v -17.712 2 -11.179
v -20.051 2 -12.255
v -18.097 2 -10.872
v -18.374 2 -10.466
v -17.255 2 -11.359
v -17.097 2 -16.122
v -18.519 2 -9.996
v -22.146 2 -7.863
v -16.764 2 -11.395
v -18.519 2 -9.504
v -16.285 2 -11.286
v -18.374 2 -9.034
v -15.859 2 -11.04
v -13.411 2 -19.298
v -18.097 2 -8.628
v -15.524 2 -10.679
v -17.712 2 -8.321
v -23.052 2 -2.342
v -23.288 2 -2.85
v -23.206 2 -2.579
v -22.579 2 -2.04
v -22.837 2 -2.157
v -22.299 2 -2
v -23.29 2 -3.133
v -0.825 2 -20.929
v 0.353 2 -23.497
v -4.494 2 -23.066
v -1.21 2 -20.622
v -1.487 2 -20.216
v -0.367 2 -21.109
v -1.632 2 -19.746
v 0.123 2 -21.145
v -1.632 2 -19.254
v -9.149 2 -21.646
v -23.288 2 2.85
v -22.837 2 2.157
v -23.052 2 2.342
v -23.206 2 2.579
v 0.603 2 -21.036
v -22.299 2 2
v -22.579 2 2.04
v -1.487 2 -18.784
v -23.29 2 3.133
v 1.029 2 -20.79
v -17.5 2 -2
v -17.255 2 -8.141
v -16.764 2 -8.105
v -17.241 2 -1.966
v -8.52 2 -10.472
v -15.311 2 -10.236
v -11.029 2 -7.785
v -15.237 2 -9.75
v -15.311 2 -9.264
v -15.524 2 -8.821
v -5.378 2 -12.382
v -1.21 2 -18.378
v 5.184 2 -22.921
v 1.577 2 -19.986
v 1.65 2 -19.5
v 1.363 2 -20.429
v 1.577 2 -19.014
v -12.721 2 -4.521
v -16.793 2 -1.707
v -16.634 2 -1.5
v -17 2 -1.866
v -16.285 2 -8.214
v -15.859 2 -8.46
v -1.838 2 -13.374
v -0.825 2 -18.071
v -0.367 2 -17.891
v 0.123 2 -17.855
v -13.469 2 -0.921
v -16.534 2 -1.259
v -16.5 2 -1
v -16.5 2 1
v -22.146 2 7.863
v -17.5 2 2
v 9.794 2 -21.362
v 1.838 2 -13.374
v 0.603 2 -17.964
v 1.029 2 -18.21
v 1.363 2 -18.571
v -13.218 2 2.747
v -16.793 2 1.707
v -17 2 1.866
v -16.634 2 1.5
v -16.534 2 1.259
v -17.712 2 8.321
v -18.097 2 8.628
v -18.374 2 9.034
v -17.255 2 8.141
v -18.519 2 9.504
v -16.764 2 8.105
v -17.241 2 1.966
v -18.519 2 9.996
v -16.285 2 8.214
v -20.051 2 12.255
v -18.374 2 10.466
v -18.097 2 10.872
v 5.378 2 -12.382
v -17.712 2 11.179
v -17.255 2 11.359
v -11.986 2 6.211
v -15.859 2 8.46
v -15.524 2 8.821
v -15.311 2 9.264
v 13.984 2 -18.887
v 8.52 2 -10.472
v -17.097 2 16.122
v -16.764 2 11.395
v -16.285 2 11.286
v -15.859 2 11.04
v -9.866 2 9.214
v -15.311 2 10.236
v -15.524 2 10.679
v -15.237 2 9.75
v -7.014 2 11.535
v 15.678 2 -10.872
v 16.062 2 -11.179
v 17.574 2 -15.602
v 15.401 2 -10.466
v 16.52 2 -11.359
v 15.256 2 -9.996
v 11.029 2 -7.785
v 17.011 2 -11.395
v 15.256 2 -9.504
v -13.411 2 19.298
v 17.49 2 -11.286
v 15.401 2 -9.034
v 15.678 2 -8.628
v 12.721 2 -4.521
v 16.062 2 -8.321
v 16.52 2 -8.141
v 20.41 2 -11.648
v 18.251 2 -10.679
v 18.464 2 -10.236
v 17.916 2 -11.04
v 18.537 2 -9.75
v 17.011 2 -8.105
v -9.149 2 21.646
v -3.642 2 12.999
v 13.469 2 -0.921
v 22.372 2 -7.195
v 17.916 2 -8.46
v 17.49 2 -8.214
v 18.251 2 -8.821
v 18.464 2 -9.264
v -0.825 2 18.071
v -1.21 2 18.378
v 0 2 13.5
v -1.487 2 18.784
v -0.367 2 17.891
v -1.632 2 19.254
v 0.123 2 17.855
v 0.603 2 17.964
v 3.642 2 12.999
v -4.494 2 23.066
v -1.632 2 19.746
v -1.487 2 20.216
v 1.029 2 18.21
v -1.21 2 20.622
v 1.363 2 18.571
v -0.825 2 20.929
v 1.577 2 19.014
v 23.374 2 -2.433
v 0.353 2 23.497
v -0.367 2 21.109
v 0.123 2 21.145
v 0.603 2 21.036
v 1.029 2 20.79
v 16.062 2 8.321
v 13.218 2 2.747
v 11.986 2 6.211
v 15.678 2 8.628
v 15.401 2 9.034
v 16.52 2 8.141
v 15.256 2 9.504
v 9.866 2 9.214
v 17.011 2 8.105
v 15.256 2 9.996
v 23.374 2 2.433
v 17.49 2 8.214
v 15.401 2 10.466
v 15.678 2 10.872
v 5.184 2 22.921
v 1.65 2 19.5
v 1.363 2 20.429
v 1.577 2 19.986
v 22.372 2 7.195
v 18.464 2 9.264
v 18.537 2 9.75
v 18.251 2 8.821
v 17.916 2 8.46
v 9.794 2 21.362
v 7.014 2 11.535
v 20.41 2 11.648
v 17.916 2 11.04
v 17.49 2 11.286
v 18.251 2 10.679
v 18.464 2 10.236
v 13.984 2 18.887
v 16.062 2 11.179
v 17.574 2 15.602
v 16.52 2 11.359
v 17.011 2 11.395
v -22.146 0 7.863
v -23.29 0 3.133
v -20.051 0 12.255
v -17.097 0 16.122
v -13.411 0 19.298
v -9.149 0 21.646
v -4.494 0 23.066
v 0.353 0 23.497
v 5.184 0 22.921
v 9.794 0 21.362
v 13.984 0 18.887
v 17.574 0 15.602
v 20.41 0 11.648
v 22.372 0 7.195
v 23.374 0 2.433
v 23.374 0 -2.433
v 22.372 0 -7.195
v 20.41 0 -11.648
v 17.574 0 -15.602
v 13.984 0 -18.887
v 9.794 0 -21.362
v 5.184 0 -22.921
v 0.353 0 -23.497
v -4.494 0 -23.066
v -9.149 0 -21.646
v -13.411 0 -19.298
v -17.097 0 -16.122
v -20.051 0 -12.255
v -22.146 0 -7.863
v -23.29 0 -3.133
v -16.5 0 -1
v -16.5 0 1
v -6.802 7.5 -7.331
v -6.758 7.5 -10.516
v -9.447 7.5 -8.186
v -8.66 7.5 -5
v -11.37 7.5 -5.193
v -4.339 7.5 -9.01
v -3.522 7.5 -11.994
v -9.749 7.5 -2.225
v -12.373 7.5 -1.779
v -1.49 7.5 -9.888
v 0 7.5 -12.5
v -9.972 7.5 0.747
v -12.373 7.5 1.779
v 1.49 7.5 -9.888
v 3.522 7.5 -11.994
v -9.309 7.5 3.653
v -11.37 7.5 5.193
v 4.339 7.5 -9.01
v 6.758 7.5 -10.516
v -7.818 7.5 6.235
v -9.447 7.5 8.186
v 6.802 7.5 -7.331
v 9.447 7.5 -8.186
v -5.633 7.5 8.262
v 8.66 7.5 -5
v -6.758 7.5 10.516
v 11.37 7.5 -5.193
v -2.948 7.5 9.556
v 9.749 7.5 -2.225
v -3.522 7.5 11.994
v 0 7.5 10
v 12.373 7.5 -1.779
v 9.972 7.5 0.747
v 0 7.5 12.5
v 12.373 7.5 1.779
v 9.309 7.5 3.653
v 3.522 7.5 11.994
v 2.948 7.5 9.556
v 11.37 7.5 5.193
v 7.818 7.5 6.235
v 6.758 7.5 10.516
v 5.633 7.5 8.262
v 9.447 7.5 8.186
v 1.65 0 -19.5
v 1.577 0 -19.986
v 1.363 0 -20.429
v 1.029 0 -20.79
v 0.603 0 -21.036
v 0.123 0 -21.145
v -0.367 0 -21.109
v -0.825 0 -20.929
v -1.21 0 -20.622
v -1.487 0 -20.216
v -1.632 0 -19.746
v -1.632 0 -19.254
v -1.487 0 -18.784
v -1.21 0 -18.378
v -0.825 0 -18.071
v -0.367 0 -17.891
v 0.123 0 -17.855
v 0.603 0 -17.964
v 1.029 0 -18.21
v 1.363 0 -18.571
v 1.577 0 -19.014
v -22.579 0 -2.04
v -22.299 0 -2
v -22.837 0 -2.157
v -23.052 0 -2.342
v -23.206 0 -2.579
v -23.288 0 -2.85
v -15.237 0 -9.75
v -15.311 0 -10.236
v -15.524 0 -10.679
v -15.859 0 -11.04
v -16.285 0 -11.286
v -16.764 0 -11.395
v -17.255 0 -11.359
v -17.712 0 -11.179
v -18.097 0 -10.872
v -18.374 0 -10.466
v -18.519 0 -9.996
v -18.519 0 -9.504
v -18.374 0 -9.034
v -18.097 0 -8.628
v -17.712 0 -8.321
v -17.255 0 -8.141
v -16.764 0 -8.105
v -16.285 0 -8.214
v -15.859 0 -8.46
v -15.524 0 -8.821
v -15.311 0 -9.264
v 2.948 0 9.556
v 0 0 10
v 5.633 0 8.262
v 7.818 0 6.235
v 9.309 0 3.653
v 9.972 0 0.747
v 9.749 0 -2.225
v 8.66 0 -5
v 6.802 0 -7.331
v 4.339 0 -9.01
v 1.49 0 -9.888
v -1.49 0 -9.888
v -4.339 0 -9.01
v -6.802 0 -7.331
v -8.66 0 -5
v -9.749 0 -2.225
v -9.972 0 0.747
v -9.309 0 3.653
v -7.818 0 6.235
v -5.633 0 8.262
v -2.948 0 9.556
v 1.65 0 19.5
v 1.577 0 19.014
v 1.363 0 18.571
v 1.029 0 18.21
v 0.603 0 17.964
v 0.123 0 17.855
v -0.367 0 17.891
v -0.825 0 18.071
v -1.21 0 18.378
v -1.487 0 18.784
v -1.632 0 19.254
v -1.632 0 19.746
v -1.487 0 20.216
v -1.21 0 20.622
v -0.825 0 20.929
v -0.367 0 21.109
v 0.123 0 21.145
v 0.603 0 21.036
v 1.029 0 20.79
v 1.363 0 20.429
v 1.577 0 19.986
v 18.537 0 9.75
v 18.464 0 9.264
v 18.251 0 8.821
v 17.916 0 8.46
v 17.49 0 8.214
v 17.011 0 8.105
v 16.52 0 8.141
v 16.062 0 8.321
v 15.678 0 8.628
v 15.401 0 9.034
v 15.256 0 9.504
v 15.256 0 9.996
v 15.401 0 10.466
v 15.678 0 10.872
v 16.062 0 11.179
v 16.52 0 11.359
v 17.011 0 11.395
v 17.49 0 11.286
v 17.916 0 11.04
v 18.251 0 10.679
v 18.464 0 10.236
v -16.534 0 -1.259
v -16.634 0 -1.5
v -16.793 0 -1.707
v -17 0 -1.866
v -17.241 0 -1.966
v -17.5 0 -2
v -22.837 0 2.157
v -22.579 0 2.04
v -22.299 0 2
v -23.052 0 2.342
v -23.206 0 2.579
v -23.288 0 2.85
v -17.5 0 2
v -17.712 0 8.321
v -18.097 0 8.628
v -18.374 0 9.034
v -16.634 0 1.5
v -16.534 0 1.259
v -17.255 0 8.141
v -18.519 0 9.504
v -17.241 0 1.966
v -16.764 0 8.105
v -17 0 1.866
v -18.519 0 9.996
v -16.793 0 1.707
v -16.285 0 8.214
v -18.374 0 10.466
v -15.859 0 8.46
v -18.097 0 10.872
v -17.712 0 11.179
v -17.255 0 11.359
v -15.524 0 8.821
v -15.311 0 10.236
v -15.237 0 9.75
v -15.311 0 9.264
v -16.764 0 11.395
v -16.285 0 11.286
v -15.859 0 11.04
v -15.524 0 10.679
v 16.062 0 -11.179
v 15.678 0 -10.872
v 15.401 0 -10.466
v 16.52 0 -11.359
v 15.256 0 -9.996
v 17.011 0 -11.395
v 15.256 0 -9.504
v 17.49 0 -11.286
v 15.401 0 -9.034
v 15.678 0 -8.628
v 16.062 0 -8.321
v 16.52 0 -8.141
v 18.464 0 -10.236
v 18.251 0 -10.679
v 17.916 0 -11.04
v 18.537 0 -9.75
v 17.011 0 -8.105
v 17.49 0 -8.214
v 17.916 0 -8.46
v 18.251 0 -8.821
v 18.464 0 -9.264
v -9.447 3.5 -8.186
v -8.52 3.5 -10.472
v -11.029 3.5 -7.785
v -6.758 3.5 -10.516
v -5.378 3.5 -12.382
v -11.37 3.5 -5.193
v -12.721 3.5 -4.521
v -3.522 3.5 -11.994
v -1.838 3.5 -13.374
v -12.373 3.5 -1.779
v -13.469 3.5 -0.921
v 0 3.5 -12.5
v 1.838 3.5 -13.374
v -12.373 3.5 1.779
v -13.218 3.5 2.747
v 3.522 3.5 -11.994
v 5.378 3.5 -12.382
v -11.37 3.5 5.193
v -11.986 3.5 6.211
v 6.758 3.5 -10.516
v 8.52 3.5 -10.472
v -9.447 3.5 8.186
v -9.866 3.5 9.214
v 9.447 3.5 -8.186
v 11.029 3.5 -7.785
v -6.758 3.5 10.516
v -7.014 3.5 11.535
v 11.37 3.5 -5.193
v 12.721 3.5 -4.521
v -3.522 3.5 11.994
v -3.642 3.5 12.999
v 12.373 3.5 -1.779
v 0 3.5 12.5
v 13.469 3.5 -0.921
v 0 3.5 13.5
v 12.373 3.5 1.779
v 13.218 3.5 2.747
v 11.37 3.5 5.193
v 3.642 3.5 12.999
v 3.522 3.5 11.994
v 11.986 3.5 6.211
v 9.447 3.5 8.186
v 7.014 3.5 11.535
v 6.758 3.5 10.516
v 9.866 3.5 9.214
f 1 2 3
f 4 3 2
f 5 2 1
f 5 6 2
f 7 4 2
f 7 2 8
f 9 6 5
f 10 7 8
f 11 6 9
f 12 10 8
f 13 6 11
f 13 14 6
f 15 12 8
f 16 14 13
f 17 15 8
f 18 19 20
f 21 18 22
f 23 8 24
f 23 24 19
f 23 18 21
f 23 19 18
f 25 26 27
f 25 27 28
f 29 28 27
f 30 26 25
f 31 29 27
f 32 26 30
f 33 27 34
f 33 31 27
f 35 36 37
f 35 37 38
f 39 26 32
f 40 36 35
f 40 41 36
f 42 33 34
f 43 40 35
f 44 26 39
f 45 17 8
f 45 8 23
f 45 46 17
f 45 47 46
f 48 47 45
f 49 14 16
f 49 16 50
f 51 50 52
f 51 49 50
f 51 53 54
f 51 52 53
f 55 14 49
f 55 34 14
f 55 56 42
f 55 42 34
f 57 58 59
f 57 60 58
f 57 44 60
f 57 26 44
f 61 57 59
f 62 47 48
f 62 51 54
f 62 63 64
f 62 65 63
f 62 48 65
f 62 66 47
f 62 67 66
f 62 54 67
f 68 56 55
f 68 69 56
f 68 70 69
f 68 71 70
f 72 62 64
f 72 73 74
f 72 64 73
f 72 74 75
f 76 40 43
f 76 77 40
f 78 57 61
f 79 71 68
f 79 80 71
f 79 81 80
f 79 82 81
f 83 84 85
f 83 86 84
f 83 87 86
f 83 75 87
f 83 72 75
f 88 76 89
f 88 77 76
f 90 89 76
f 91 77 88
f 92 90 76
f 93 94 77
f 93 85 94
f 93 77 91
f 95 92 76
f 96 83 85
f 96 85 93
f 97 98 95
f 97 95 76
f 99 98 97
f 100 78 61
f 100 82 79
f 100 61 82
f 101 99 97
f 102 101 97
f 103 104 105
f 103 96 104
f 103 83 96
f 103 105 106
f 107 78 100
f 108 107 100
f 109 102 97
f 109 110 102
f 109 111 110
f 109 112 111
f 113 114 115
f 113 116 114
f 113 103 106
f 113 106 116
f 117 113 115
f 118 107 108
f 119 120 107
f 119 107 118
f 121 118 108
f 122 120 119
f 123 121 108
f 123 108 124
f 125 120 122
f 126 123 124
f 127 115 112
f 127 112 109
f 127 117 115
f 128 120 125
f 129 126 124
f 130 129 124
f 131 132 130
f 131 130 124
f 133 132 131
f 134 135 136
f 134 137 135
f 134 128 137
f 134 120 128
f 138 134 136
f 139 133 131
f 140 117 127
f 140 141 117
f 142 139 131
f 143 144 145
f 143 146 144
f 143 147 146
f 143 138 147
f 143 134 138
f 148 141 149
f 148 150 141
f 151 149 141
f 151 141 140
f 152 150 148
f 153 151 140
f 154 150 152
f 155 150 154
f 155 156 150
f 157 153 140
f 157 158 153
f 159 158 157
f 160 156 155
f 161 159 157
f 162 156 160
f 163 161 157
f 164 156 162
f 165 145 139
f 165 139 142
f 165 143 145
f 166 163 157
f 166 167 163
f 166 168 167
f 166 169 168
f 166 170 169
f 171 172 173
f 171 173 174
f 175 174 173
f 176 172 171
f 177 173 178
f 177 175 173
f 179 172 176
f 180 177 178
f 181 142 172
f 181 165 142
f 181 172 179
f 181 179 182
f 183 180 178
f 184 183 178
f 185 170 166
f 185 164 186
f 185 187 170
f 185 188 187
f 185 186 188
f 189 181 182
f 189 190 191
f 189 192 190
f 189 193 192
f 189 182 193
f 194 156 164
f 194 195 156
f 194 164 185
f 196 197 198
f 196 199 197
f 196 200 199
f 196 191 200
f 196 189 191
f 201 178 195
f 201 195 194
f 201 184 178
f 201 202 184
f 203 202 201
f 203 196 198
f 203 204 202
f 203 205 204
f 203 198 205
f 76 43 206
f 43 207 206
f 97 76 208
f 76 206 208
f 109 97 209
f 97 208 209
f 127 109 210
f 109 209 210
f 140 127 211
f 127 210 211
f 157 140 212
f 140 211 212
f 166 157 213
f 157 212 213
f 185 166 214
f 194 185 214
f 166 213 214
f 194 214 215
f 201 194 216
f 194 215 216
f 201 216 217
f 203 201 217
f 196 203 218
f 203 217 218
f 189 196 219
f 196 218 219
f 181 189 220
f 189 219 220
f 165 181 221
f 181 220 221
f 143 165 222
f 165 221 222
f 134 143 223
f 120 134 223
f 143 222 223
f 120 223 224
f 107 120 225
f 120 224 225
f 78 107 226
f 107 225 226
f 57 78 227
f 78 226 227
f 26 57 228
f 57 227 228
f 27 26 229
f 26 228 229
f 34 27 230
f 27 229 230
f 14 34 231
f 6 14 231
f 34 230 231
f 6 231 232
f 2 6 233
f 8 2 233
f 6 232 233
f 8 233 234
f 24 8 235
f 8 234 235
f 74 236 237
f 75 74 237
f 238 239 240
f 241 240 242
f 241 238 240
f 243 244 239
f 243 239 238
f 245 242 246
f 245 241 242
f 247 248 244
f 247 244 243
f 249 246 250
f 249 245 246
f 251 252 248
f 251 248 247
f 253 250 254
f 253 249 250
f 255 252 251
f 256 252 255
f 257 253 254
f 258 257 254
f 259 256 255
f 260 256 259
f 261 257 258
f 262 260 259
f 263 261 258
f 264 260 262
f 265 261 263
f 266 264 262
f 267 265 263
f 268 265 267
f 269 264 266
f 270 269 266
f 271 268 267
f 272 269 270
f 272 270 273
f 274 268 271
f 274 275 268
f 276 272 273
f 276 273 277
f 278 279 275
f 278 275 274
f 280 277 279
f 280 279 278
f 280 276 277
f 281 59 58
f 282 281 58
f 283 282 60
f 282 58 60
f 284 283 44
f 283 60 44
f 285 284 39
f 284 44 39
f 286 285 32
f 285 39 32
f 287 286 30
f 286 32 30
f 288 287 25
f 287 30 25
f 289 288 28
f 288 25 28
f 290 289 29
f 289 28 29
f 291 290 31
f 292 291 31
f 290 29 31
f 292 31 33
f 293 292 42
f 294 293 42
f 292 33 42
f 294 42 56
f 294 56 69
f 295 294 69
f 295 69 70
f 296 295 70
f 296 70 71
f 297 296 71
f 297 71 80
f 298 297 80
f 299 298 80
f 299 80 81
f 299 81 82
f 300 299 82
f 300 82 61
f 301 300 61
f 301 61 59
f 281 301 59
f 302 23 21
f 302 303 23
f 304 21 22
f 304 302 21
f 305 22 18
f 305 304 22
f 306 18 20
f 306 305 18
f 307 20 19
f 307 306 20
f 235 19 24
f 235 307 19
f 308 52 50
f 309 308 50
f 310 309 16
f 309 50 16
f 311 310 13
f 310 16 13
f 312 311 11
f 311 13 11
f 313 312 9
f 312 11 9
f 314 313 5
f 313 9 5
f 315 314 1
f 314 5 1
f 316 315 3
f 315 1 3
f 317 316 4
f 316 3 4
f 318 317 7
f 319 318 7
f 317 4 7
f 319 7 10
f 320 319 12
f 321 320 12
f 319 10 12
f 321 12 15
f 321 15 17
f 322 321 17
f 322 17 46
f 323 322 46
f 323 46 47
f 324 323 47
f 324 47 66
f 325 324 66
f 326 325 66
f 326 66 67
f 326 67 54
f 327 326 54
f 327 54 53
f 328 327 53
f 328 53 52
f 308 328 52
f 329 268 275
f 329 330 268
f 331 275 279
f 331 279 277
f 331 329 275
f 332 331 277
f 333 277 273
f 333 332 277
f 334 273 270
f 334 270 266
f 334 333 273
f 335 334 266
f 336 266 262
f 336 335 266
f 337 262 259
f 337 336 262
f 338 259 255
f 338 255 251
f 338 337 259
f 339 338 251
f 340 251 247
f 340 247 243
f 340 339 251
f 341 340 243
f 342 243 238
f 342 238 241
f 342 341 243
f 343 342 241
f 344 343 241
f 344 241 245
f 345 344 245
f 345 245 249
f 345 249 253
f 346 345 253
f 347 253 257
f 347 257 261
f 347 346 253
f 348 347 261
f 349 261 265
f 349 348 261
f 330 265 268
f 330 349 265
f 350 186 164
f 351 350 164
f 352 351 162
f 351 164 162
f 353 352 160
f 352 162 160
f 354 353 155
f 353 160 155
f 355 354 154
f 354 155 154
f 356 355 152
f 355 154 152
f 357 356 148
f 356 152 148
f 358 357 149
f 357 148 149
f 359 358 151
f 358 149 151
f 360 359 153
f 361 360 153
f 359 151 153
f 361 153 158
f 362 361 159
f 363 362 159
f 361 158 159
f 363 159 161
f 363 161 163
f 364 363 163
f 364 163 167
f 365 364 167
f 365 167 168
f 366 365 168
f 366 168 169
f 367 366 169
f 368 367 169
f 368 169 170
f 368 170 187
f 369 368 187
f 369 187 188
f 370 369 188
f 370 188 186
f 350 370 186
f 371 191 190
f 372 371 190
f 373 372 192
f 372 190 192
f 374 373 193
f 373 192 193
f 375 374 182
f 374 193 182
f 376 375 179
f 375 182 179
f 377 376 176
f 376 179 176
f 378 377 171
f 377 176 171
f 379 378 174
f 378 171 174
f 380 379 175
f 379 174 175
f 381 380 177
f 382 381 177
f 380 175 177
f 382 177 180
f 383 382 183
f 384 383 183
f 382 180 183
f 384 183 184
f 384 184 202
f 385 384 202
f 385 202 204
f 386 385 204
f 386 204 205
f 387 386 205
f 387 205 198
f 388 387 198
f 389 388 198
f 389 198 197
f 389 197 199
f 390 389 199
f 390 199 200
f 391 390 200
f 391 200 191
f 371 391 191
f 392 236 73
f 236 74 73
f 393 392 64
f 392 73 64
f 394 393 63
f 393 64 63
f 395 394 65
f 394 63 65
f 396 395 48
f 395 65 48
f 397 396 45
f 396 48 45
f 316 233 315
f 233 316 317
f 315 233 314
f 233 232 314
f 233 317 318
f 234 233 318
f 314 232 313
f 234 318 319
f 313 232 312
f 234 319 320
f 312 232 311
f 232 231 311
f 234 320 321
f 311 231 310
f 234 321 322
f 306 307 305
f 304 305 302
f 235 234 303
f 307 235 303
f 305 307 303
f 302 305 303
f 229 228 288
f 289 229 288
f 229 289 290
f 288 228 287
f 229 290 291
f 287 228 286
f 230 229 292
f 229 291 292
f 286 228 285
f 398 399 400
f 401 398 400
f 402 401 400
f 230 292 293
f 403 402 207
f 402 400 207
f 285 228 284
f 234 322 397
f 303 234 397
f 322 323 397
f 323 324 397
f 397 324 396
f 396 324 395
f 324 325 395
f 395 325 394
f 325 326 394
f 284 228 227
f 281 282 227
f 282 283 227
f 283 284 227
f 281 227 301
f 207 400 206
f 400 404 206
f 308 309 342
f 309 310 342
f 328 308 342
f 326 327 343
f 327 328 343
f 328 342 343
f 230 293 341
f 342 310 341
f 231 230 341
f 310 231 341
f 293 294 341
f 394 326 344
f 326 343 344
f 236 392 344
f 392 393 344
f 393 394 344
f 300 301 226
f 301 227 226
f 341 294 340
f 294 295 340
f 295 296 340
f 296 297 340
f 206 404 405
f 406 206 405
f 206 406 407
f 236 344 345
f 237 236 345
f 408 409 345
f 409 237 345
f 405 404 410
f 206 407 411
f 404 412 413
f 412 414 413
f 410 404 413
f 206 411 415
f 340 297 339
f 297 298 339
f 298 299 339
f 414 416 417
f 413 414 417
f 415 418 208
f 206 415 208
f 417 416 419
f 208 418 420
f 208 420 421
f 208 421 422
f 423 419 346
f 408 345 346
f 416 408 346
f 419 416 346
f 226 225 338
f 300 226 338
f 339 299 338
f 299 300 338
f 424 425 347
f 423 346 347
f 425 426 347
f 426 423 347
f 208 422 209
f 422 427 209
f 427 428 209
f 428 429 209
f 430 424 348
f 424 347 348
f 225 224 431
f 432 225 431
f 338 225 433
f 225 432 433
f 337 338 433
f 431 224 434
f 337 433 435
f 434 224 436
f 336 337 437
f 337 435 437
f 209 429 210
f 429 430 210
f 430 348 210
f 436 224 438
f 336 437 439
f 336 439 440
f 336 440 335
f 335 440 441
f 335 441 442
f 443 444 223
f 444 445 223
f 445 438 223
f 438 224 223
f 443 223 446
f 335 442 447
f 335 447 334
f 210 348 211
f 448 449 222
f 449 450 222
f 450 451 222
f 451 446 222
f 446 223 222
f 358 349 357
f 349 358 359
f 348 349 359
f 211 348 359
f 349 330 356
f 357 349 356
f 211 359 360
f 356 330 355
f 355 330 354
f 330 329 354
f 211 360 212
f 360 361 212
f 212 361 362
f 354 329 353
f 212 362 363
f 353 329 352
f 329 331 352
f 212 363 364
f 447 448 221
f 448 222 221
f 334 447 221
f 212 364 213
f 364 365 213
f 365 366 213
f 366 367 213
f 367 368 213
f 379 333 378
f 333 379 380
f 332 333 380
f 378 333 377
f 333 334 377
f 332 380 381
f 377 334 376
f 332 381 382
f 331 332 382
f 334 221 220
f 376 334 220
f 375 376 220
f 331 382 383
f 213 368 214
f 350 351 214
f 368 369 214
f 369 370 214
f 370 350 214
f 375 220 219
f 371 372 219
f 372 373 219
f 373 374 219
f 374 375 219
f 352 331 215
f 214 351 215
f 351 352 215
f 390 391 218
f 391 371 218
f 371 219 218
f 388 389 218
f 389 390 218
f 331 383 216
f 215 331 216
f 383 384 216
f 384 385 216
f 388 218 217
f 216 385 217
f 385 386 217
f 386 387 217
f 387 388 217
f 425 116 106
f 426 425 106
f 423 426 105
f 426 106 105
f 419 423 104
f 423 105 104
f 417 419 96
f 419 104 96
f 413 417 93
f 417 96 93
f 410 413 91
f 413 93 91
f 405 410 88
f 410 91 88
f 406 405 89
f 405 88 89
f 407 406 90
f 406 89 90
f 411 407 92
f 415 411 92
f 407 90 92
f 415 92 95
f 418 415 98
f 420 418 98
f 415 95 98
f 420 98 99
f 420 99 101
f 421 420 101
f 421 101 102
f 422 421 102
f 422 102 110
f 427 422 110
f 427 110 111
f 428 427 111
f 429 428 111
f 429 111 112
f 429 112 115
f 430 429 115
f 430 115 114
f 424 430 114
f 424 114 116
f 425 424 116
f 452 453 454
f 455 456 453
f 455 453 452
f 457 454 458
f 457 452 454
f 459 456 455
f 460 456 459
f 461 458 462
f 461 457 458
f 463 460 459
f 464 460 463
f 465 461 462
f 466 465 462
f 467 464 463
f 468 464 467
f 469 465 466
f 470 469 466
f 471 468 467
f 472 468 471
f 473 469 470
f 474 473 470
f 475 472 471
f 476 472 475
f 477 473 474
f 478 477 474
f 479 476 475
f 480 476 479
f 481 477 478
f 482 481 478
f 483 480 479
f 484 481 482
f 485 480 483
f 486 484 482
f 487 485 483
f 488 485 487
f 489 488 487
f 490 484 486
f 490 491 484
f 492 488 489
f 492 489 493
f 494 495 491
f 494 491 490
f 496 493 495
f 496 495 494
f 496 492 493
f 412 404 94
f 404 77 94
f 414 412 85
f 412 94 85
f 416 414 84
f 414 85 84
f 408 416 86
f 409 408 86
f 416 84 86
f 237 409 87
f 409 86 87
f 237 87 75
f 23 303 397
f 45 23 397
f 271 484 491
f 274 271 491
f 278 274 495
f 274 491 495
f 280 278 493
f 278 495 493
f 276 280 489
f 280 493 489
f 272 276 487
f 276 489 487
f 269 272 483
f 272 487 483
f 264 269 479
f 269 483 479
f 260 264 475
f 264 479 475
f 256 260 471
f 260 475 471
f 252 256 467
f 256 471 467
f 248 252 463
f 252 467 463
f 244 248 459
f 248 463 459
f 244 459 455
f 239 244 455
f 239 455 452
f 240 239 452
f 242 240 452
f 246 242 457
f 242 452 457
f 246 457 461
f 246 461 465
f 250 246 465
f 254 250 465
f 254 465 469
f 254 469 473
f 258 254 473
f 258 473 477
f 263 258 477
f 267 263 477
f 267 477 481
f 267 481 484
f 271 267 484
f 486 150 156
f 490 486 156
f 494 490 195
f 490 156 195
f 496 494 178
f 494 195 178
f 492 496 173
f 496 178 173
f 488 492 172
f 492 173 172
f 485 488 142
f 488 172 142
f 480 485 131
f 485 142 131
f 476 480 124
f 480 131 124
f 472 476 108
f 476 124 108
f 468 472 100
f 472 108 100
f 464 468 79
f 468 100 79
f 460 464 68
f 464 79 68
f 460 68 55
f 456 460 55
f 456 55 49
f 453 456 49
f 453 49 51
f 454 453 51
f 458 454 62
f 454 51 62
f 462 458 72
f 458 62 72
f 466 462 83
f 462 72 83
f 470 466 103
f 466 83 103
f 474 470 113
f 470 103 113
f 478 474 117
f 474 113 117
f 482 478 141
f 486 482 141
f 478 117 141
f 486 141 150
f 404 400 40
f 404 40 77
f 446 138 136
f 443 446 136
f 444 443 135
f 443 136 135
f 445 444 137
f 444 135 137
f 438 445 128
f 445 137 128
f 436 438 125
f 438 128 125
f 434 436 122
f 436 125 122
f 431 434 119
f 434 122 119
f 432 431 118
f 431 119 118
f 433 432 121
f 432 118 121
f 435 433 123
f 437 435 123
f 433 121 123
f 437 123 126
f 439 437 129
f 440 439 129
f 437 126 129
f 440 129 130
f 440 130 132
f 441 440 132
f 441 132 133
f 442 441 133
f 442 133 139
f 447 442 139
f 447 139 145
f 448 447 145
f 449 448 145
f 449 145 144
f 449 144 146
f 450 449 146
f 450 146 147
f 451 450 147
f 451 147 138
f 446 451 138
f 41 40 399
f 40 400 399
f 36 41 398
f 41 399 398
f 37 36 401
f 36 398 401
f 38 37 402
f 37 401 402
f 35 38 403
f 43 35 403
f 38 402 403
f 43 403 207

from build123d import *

# Parameters (mm, degrees)
SKETCH_1_R          = 23.5
SKETCH_1_R_2        = 10
SKETCH_1_R_3        = 1
EXTRUDE_1_DEPTH     = 2
SKETCH_2_R          = 12.5
SKETCH_2_R_2        = 10
EXTRUDE_2_DEPTH     = 5.5
SKETCH_3_R          = 13.5
SKETCH_3_R_2        = 12.5
EXTRUDE_3_DEPTH     = 1.5
SKETCH_4_W          = 7.756986748
SKETCH_4_H          = 4
CUT_EXTRUDE_1_DEPTH = 10
FILLET_1_R          = 1
HOLE_WIZARD_M4_1_D  = 3.3


with BuildPart() as part:
    # 草图1 → 凸台-拉伸1 (new body)
    with BuildSketch(Plane(origin=(0, 0, 0), x_dir=(1, 0, 0), z_dir=(0, 1, 0))):
        with Locations(Location((0, 0, 0), (0, 0, 270))):
            Circle(SKETCH_1_R)
        with Locations(Location((0, 0, 0), (0, 0, 270))):
            Circle(SKETCH_1_R_2, mode=Mode.SUBTRACT)
        with Locations(Location((0, 19.5, 0), (0, 0, 270))):
            Circle(SKETCH_1_R_3, mode=Mode.SUBTRACT)
        with Locations(Location((16.887495374, 9.75, 0), (0, 0, 270))):
            Circle(SKETCH_1_R_3, mode=Mode.SUBTRACT)
        with Locations(Location((16.887495374, -9.75, 0), (0, 0, 270))):
            Circle(SKETCH_1_R_3, mode=Mode.SUBTRACT)
        with Locations(Location((0, -19.5, 0), (0, 0, 270))):
            Circle(SKETCH_1_R_3, mode=Mode.SUBTRACT)
        with Locations(Location((-16.887495374, -9.75, 0), (0, 0, 270))):
            Circle(SKETCH_1_R_3, mode=Mode.SUBTRACT)
        with Locations(Location((-16.887495374, 9.75, 0), (0, 0, 270))):
            Circle(SKETCH_1_R_3, mode=Mode.SUBTRACT)
    extrude(amount=EXTRUDE_1_DEPTH)

    # 草图2 → 凸台-拉伸2 (add)
    with BuildSketch(Plane(origin=(0, 2, 0), x_dir=(1, 0, 0), z_dir=(0, 1, 0))):
        with Locations(Location((0, 0, 0), (0, 0, 270))):
            Circle(SKETCH_2_R)
        with Locations(Location((0, 0, 0), (0, 0, 270))):
            Circle(SKETCH_2_R_2, mode=Mode.SUBTRACT)
    extrude(amount=EXTRUDE_2_DEPTH)

    # 草图3 → 凸台-拉伸3 (add)
    with BuildSketch(Plane(origin=(0, 2, 0), x_dir=(1, 0, 0), z_dir=(0, 1, 0))):
        with Locations(Location((0, 0, 0), (0, 0, 270))):
            Circle(SKETCH_3_R)
        with Locations(Location((0, 0, 0), (0, 0, 270))):
            Circle(SKETCH_3_R_2, mode=Mode.SUBTRACT)
    extrude(amount=EXTRUDE_3_DEPTH)

    # 草图4 → 切除-拉伸1 (cut)
    with BuildSketch(Plane.XZ):
        with Locations((-20.378493374, 0)):
            Rectangle(SKETCH_4_W, SKETCH_4_H)
    extrude(amount=-CUT_EXTRUDE_1_DEPTH, mode=Mode.SUBTRACT)

    # 圆角1
    fillet_1_edges = [part.edges().sort_by_distance(p)[0] for p in [
        (-23.414738948, 1, -2),
        (-23.414738948, 1, 2),
        (-16.5, 1, 2),
        (-16.5, 1, -2),
    ]]
    fillet(fillet_1_edges, radius=FILLET_1_R)

    # M4 螺纹孔1 (through all)
    with Locations(Plane(origin=(0, 0, 0), x_dir=(-1, 0, 0), z_dir=(0, -1, 0))):
        with Locations((0, 19.5), (-16.887495374, 9.75), (-16.887495374, -9.75), (0, -19.5), (16.887495374, -9.75), (16.887495374, 9.75)):
            Hole(HOLE_WIZARD_M4_1_D / 2)


solid = part.part
